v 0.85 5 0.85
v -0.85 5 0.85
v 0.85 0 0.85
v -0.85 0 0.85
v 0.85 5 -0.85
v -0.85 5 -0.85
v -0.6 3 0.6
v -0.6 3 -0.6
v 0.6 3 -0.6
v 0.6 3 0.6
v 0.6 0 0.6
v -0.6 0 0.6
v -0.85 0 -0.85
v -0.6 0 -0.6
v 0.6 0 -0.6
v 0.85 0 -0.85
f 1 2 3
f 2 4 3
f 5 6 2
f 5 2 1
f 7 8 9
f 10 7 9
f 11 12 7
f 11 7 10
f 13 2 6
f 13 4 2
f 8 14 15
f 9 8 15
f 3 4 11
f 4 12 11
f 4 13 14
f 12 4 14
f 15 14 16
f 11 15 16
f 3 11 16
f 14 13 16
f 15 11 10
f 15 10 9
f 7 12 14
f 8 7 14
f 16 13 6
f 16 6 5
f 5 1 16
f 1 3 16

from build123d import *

# Parameters (mm, degrees)
SKETCH_1_W      = 1.7
SKETCH_1_H      = 1.7
SKETCH_1_W_2    = 1.2
SKETCH_1_H_2    = 1.2
EXTRUDE_1_DEPTH = 3
SKETCH_2_W      = 1.7
SKETCH_2_H      = 1.7
EXTRUDE_2_DEPTH = 2


with BuildPart() as part:
    # 草图1 → 凸台-拉伸1 (new body)
    with BuildSketch(Plane(origin=(0, 0, 0), x_dir=(1, 0, 0), z_dir=(0, 1, 0))):
        Rectangle(SKETCH_1_W, SKETCH_1_H)
        Rectangle(SKETCH_1_W_2, SKETCH_1_H_2, mode=Mode.SUBTRACT)
    extrude(amount=EXTRUDE_1_DEPTH)

    # 草图2 → 凸台-拉伸2 (add)
    with BuildSketch(Plane(origin=(0, 3, 0), x_dir=(1, 0, 0), z_dir=(0, 1, 0))):
        Rectangle(SKETCH_2_W, SKETCH_2_H)
    extrude(amount=EXTRUDE_2_DEPTH)


solid = part.part
